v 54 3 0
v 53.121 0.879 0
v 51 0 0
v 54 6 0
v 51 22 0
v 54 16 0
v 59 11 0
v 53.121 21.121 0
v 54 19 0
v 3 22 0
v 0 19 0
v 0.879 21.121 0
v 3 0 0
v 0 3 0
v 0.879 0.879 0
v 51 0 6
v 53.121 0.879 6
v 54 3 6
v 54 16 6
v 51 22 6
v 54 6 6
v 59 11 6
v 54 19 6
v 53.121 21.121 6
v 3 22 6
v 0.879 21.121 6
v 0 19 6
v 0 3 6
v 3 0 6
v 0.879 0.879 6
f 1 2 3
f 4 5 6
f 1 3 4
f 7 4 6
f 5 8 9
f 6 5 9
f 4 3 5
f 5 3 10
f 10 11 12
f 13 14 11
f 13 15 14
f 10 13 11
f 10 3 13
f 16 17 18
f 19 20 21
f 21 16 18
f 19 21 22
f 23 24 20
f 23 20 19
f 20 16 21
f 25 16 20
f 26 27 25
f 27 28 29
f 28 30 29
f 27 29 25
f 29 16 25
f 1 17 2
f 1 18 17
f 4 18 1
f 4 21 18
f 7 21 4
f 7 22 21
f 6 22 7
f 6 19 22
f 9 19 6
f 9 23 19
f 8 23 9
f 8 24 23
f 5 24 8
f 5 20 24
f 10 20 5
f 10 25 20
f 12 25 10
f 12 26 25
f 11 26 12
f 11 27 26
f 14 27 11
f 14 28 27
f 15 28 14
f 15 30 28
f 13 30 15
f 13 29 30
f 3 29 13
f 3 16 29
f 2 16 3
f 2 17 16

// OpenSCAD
$fn = 32;

// ----------------------------------------------------------------------
// Ratchet pawl: 54 x 22 mm body, beak 5 mm с правого торца
// ----------------------------------------------------------------------

// --- parameters (mm) ---
profile_height = 6;       // extrusion height
profile_points = 15;      // points of the closed outline

profile = [[0, 3], [0.879, 0.879], [3, 0], [51, 0], [53.121, 0.879], [54, 3], [54, 6], [59, 11], [54, 16], [54, 19], [53.121, 21.121], [51, 22], [3, 22], [0.879, 21.121], [0, 19]];  // single closed polygon, 15 points, counter clockwise

// --- the one profile operation ---
linear_extrude(height = profile_height) polygon(points = profile);
